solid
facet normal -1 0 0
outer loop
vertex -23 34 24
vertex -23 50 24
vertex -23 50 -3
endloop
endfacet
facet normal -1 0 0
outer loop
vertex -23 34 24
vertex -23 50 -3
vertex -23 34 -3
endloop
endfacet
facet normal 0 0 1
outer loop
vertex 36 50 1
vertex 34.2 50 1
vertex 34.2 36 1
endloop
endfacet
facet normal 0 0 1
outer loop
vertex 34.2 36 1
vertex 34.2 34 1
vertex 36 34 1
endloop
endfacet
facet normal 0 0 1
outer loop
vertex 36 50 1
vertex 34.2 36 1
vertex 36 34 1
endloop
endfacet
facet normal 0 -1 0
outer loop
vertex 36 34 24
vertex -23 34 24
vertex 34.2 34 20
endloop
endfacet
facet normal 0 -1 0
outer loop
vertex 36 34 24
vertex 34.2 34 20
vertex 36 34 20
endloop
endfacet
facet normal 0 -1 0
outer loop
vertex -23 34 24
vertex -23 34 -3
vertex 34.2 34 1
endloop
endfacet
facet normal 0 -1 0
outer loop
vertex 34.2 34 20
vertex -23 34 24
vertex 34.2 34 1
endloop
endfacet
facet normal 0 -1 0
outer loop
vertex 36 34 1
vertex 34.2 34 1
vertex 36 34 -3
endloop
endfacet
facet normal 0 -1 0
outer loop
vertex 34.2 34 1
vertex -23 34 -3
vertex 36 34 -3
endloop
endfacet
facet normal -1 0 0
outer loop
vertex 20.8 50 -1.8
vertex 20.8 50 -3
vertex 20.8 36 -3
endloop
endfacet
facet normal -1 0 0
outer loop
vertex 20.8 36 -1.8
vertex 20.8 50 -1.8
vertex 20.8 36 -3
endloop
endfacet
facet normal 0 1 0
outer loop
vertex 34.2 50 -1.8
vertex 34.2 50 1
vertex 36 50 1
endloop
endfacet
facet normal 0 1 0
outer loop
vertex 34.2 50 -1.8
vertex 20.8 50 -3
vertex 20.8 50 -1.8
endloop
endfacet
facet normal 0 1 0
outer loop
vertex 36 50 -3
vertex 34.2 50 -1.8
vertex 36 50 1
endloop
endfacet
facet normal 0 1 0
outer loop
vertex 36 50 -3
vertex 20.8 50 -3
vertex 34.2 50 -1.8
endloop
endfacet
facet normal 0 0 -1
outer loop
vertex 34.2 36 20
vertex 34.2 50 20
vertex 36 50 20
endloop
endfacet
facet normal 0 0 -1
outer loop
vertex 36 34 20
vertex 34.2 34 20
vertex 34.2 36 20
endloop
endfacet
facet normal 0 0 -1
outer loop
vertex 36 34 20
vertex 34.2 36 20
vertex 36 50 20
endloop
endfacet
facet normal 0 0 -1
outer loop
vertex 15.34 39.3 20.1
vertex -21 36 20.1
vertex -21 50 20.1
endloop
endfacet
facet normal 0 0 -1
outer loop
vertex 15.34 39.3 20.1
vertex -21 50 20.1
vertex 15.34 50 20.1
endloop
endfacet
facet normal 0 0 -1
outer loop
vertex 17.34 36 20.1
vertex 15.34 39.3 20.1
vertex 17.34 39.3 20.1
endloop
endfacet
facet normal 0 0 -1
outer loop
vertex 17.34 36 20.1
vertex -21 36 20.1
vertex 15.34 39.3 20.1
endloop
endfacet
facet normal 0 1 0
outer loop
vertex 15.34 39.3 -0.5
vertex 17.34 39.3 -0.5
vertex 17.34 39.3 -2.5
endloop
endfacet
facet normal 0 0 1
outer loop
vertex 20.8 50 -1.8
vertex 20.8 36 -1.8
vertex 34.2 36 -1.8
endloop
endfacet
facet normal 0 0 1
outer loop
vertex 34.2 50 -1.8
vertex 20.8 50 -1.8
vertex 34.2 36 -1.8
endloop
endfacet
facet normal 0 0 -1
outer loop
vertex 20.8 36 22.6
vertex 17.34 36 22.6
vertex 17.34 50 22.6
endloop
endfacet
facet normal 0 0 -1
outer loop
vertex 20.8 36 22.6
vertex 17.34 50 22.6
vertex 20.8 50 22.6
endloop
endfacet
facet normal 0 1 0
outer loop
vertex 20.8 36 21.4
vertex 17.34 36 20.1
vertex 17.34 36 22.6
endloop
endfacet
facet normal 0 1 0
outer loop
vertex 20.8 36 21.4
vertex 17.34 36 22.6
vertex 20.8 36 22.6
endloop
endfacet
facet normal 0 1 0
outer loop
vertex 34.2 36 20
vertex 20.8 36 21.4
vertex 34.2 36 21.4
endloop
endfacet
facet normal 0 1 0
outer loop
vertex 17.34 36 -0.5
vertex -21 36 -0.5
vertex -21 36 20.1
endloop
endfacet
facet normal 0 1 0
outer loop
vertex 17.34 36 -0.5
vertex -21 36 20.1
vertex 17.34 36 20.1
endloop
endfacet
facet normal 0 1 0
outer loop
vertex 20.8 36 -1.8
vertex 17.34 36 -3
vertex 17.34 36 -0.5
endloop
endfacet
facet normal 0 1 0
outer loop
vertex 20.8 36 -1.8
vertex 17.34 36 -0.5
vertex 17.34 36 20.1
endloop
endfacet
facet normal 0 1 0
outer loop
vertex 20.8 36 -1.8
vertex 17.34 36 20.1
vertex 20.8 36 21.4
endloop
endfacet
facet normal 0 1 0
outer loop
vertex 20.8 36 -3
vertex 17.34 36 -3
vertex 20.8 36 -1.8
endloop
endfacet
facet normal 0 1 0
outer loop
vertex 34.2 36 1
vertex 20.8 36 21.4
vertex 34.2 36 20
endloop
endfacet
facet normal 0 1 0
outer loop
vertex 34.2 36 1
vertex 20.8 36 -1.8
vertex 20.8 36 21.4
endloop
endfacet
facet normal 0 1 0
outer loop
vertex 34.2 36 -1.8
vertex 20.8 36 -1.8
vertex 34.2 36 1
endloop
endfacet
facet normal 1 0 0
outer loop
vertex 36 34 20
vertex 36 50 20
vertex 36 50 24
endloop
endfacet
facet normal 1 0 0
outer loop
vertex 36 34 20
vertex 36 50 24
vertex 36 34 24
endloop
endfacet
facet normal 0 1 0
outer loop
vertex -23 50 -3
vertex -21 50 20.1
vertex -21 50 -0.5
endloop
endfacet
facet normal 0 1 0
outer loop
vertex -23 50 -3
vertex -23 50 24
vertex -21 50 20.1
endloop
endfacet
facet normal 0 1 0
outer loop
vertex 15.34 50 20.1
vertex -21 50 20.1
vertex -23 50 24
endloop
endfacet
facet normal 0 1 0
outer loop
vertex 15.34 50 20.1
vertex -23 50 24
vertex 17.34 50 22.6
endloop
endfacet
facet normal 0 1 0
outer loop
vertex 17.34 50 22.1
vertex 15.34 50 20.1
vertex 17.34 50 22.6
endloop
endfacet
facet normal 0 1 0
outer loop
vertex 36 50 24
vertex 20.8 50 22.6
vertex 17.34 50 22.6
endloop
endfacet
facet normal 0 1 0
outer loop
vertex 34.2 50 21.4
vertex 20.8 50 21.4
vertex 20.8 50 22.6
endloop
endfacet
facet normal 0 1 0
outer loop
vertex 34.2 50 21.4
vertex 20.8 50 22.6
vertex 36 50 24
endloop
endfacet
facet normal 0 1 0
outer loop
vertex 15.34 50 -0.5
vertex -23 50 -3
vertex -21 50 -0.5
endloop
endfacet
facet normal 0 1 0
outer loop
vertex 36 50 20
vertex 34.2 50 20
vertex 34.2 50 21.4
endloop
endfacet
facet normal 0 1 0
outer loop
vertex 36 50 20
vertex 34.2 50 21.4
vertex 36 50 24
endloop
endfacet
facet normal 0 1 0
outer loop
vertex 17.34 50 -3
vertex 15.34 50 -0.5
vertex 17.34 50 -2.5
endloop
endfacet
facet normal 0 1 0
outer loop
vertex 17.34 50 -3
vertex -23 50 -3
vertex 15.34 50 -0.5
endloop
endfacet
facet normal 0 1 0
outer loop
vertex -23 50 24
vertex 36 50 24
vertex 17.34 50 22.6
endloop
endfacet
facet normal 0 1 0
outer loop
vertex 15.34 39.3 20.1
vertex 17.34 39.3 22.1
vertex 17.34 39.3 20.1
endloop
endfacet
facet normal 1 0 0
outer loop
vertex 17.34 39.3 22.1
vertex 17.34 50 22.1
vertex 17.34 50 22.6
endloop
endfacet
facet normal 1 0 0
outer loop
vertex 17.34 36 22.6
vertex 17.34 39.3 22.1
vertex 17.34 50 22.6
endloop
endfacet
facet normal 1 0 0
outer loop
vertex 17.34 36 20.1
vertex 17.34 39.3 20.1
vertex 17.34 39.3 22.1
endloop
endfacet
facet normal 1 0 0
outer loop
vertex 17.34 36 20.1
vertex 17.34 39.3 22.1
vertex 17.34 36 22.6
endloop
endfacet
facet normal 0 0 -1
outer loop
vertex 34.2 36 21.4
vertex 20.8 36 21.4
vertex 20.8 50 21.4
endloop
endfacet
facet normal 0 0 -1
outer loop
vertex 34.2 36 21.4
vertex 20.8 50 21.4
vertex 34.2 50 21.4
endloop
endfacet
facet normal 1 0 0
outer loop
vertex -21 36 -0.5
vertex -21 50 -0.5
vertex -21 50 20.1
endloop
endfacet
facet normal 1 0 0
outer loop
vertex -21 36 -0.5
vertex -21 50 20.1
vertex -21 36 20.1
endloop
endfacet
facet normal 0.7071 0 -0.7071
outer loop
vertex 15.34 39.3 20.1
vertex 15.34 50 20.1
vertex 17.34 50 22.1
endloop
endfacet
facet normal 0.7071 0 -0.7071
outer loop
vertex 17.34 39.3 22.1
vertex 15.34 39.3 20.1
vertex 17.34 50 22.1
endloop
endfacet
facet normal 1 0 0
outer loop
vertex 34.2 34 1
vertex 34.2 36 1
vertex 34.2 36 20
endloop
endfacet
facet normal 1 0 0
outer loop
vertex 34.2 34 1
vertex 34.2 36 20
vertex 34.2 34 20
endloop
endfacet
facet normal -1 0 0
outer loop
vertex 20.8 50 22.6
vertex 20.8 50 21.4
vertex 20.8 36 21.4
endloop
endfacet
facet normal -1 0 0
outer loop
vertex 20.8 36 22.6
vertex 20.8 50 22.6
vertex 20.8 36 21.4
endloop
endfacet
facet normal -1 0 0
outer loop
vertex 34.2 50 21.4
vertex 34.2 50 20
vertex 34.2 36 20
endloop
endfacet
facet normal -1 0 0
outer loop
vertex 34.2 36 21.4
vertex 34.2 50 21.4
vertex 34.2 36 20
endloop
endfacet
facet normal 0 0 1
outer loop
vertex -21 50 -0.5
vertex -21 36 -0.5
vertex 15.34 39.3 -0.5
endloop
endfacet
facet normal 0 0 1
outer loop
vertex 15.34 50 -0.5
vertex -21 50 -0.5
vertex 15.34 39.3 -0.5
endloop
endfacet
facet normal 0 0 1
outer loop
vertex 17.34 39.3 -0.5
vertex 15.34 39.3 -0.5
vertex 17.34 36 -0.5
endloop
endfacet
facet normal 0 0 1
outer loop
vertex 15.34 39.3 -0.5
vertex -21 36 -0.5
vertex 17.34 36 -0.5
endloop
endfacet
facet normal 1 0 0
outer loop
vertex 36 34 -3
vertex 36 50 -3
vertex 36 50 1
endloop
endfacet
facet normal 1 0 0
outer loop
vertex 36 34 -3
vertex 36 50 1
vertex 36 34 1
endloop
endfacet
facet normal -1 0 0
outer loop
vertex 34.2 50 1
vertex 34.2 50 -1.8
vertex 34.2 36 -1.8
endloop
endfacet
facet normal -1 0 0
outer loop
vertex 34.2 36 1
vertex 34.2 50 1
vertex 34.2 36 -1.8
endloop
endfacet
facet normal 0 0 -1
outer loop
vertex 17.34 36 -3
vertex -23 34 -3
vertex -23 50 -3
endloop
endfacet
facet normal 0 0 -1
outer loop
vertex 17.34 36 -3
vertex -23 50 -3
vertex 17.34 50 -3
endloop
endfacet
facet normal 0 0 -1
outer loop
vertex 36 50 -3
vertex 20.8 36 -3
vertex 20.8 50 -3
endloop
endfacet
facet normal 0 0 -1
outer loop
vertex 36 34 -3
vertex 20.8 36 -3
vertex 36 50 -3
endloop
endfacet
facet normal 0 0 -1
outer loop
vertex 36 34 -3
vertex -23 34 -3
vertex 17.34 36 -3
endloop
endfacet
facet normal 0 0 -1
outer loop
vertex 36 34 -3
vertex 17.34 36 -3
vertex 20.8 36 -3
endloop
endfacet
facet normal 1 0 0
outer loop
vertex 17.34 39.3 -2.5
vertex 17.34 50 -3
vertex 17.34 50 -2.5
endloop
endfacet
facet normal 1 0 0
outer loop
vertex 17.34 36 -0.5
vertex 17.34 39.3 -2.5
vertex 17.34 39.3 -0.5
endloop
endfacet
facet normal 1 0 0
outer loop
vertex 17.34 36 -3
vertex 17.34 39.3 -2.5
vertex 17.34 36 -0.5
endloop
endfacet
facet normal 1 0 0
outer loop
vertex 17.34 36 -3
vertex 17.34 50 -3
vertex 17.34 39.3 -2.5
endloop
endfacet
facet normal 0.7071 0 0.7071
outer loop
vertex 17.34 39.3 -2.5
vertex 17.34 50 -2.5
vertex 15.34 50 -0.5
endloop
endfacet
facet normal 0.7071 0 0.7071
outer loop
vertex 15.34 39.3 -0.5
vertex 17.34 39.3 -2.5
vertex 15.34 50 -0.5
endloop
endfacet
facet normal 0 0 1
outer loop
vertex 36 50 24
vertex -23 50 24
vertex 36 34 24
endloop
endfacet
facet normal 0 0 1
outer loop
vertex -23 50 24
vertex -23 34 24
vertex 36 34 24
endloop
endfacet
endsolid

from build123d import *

# Parameters (mm, degrees)
EXTRUDE_DEPTH                     = 10.7
EXTRUDE_ONTO_SKETCH002_ROLL_ANGLE = 90
BOX021_W                          = 1.8
BOX021_H                          = 16
BOX021_DEPTH                      = 4
BOX_W                             = 38.34
BOX_H                             = 14
BOX_DEPTH                         = 2.5
BOX007_W                          = 55.2
BOX007_H                          = 2
BOX007_DEPTH                      = 27
BOX008_W                          = 2
BOX008_H                          = 16
BOX008_DEPTH                      = 27
BOX009_W                          = 1.8
BOX009_H                          = 16
BOX009_DEPTH                      = 4
BOX019_W                          = 13.4
BOX019_H                          = 14
BOX019_DEPTH                      = 1.2
BOX018_W                          = 38.34
BOX018_H                          = 14
BOX018_DEPTH                      = 2.5
BOX020_W                          = 55.2
BOX020_H                          = 14
BOX020_DEPTH                      = 1.4
BOX005_W                          = 13.4
BOX005_H                          = 14
BOX005_DEPTH                      = 1.2


with BuildPart() as motorclipholes:
    # Sketch002 as drawn → Extrude (new)
    with BuildSketch(Plane.XY):
        Polygon((16.24, -0.5), (18.24, -0.5), (18.24, -2.5), align=None)
        Polygon((18.24, 22.1), (18.24, 20.1), (16.24, 20.1), align=None)
    extrude(amount=-EXTRUDE_DEPTH)


with BuildPart() as motorclipholes_1:
    # Extrude onto Sketch002 roll: moved
    add(motorclipholes.part.rotate(Axis((0, 0, 0), (1, 0, 0)), EXTRUDE_ONTO_SKETCH002_ROLL_ANGLE))


with BuildPart() as motorclipholes_2:
    # Extrude onto Sketch002 placement: moved
    add(motorclipholes_1.part.moved(Location((-0.9, -37, 0))))


with BuildPart() as cube020:
    # Box021 → Box021 (new body)
    with BuildSketch(Plane(origin=(35.1, -37, 20), x_dir=(1, 0, 0), z_dir=(0, 0, 1))):
        with Locations((0.9, 8)):
            Rectangle(BOX021_W, BOX021_H)
    extrude(amount=BOX021_DEPTH)


with BuildPart() as cube003:
    # Box → Box (new body)
    with BuildSketch(Plane(origin=(-20.1, -37, -3), x_dir=(1, 0, 0), z_dir=(0, 0, 1))):
        with Locations((19.17, 7)):
            Rectangle(BOX_W, BOX_H)
    extrude(amount=BOX_DEPTH)


with BuildPart() as cube006:
    # Box007 → Box007 (new body)
    with BuildSketch(Plane(origin=(-20.1, -23, -3), x_dir=(1, 0, 0), z_dir=(0, 0, 1))):
        with Locations((27.6, 1)):
            Rectangle(BOX007_W, BOX007_H)
    extrude(amount=BOX007_DEPTH)


with BuildPart() as cube007:
    # Box008 → Box008 (new body)
    with BuildSketch(Plane(origin=(-22.1, -37, -3), x_dir=(1, 0, 0), z_dir=(0, 0, 1))):
        with Locations((1, 8)):
            Rectangle(BOX008_W, BOX008_H)
    extrude(amount=BOX008_DEPTH)


with BuildPart() as cube008:
    # Box009 → Box009 (new body)
    with BuildSketch(Plane(origin=(35.1, -37, -3), x_dir=(1, 0, 0), z_dir=(0, 0, 1))):
        with Locations((0.9, 8)):
            Rectangle(BOX009_W, BOX009_H)
    extrude(amount=BOX009_DEPTH)


with BuildPart() as cube018:
    # Box019 → Box019 (new body)
    with BuildSketch(Plane(origin=(21.7, -37, 21.4), x_dir=(1, 0, 0), z_dir=(0, 0, 1))):
        with Locations((6.7, 7)):
            Rectangle(BOX019_W, BOX019_H)
    extrude(amount=BOX019_DEPTH)


with BuildPart() as cube017:
    # Box018 → Box018 (new body)
    with BuildSketch(Plane(origin=(-20.1, -37, 20.1), x_dir=(1, 0, 0), z_dir=(0, 0, 1))):
        with Locations((19.17, 7)):
            Rectangle(BOX018_W, BOX018_H)
    extrude(amount=BOX018_DEPTH)


with BuildPart() as cube019:
    # Box020 → Box020 (new body)
    with BuildSketch(Plane(origin=(-20.1, -37, 22.6), x_dir=(1, 0, 0), z_dir=(0, 0, 1))):
        with Locations((27.6, 7)):
            Rectangle(BOX020_W, BOX020_H)
    extrude(amount=BOX020_DEPTH)


with BuildPart() as motorholder:
    # Box005 → Box005 (new body)
    with BuildSketch(Plane(origin=(21.7, -37, -3), x_dir=(1, 0, 0), z_dir=(0, 0, 1))):
        with Locations((6.7, 7)):
            Rectangle(BOX005_W, BOX005_H)
    extrude(amount=BOX005_DEPTH)

    # Fusion007: union Cube020, Cube003, Cube006, Cube007, Cube008, Cube018, Cube017, Cube019
    add(cube020.part)
    add(cube003.part)
    add(cube006.part)
    add(cube007.part)
    add(cube008.part)
    add(cube018.part)
    add(cube017.part)
    add(cube019.part)


with BuildPart() as motorholder_1:
    # Fusion007 placement: moved
    add(motorholder.part.moved(Location((-0.9, 0, 0))))

    # Cut017: cut motorClipHoles
    add(motorclipholes_2.part, mode=Mode.SUBTRACT)


with BuildPart() as mirror_of_motorholder:
    # mirror: instance of motorHolder
    add(motorholder_1.part.mirror(Plane(origin=(-23, -21, 0), x_dir=(-1, 0, 0), z_dir=(0, -1, 0))))


with BuildPart() as mirror_of_motorholder_1:
    # mirror placement: moved
    add(mirror_of_motorholder.part.moved(Location((0, 55, 0))))


solid = mirror_of_motorholder_1.part
